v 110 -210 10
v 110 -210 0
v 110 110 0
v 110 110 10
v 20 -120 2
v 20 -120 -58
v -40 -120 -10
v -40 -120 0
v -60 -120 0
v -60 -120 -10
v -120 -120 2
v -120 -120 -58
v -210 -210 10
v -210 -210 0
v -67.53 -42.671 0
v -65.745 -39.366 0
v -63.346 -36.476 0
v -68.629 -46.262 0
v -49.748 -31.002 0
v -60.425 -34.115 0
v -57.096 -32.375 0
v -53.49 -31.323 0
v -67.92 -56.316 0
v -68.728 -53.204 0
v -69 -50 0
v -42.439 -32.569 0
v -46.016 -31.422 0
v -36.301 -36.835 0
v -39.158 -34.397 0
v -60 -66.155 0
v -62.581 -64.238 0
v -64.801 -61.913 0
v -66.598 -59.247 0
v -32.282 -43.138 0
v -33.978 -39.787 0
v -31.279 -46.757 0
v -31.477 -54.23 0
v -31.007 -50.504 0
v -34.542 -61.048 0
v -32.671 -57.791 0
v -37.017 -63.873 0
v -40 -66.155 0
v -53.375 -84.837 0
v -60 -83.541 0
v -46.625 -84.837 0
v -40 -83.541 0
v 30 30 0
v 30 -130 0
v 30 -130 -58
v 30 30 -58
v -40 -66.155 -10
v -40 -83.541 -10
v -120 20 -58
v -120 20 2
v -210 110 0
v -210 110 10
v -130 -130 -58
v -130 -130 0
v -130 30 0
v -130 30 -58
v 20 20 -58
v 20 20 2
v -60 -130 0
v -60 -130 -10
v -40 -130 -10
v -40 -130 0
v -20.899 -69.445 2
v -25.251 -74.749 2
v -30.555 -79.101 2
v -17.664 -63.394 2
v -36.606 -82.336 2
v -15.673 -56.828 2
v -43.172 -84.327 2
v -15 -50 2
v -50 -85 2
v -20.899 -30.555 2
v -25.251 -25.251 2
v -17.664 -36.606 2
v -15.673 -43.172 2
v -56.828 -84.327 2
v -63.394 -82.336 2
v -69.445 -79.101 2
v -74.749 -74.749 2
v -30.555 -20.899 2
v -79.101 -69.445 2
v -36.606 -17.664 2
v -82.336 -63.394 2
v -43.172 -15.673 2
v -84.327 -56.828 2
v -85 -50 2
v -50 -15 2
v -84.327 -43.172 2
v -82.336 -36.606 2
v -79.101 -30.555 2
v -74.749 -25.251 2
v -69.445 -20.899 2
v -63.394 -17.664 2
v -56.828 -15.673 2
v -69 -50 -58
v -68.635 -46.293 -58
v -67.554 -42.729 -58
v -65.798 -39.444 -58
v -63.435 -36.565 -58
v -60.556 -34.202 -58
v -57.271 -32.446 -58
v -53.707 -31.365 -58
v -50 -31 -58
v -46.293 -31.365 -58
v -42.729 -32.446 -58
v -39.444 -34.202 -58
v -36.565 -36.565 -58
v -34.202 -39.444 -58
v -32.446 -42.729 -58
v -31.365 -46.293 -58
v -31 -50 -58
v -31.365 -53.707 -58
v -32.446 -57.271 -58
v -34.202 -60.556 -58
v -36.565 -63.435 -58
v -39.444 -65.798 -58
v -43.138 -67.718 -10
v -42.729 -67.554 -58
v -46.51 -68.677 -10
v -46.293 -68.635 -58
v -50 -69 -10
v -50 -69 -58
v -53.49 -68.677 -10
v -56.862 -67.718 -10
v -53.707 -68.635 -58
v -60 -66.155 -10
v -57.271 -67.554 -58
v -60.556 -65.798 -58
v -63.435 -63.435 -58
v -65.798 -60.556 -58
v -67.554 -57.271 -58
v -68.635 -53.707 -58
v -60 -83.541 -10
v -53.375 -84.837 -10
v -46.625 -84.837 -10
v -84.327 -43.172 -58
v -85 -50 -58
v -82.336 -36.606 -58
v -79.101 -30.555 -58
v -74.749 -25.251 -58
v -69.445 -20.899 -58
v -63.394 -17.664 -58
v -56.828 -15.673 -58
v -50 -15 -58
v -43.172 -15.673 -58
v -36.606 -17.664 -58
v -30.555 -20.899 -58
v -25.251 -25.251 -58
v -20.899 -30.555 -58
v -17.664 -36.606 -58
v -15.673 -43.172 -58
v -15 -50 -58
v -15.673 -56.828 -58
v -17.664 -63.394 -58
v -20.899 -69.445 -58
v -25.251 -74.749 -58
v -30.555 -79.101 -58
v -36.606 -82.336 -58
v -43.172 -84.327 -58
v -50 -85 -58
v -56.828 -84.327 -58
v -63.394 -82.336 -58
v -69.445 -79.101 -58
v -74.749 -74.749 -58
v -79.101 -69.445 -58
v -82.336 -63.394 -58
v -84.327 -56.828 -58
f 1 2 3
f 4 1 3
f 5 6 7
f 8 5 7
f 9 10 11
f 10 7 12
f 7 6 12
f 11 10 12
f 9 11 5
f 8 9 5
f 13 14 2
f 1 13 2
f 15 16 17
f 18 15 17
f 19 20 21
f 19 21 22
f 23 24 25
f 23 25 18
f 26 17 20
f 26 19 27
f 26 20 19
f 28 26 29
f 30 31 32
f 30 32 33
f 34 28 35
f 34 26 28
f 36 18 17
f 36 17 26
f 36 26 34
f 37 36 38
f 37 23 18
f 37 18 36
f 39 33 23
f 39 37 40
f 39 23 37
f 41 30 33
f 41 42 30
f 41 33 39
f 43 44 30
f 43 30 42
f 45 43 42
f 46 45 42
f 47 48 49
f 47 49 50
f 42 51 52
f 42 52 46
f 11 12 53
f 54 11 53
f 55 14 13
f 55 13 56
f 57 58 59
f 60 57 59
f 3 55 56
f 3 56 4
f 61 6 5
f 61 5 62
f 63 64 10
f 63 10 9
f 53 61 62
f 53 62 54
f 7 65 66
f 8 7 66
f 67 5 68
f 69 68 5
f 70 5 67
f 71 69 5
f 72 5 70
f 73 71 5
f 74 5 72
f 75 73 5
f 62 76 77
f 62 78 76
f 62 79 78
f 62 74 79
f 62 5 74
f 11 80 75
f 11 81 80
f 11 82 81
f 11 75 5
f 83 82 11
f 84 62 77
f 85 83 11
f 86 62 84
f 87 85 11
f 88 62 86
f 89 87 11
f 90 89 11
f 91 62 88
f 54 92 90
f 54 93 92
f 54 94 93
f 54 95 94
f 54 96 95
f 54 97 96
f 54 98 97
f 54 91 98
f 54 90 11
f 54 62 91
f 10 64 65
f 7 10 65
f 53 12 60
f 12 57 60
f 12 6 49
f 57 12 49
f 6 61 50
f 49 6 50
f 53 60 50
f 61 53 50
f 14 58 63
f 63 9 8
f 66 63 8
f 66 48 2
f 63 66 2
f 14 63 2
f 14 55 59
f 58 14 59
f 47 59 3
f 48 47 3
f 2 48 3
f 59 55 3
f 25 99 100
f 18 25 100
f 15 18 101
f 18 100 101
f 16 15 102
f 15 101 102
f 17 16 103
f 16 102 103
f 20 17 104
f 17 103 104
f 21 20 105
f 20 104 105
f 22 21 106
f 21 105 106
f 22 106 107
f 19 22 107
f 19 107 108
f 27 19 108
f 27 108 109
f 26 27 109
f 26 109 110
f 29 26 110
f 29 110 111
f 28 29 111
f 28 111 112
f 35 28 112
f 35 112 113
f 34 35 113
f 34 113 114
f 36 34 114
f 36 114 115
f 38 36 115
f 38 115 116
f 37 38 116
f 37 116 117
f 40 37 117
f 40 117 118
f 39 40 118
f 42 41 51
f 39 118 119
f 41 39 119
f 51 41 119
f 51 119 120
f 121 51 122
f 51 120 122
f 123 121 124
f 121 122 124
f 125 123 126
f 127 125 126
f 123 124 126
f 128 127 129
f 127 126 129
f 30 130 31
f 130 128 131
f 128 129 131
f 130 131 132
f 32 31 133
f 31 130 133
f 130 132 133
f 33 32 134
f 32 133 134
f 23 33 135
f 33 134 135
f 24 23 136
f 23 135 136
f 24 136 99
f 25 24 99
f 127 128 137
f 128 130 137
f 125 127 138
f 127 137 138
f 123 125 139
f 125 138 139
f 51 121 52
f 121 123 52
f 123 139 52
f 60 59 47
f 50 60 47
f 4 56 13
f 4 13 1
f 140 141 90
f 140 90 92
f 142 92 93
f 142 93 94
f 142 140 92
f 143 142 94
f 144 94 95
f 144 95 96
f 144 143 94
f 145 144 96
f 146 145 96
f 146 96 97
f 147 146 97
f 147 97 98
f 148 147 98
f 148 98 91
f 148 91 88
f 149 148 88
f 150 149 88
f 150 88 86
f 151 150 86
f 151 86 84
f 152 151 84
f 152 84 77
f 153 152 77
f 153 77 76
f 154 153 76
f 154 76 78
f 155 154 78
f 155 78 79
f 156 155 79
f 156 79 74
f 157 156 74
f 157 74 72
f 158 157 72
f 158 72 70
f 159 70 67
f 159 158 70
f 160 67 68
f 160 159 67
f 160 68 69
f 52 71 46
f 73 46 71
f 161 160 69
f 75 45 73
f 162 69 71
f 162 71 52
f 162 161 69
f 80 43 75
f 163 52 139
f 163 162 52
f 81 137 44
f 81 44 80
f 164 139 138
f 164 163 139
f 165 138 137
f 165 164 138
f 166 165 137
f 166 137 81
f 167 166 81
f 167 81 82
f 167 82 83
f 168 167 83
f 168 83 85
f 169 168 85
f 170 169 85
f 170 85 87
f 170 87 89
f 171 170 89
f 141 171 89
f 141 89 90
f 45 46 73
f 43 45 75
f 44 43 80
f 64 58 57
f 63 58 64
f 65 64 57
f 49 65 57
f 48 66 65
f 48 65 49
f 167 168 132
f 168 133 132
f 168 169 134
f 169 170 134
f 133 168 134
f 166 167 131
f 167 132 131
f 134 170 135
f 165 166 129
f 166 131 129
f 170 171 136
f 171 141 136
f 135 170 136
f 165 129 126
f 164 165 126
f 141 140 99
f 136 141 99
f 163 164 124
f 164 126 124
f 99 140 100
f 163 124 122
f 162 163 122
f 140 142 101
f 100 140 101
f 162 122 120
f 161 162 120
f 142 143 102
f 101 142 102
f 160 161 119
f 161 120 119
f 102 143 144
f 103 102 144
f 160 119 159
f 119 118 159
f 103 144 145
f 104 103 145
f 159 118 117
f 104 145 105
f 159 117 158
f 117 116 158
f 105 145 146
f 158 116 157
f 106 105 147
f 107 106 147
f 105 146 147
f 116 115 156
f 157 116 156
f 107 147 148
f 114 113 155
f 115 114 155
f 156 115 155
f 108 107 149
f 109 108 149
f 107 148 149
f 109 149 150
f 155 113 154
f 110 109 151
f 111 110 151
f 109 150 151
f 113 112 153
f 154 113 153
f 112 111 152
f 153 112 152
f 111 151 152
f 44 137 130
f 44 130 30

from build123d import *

# Parameters (mm, degrees)
CROQUIS1_W              = 320
CROQUIS1_H              = 320
SALIENTE_EXTRUIR2_DEPTH = 10
CROQUIS2_W              = 160
CROQUIS2_H              = 160
SALIENTE_EXTRUIR3_DEPTH = 58
CROQUIS3_R              = 19
CORTAR_EXTRUIR1_DEPTH   = 58
CROQUIS6_W              = 140
CROQUIS6_H              = 140
CROQUIS6_R              = 35
CORTAR_EXTRUIR5_DEPTH   = 60
CROQUIS7_W              = 20
CROQUIS7_H              = 10
CORTAR_EXTRUIR6_DEPTH   = 69


with BuildPart() as part:
    # Croquis1 → Saliente-Extruir2 (new body)
    with BuildSketch(Plane.XY):
        with Locations((-50, -50)):
            Rectangle(CROQUIS1_W, CROQUIS1_H)
    extrude(amount=SALIENTE_EXTRUIR2_DEPTH)

    # Croquis2 → Saliente-Extruir3 (add)
    with BuildSketch(Plane.XY):
        with Locations((-50, -50)):
            Rectangle(CROQUIS2_W, CROQUIS2_H)
    extrude(amount=-SALIENTE_EXTRUIR3_DEPTH)

    # Croquis3 → Cortar-Extruir1 (cut)
    with BuildSketch(Plane(origin=(0, 0, -58), x_dir=(-1, 0, 0), z_dir=(0, 0, -1))):
        with Locations((50, -50)):
            Circle(CROQUIS3_R)
    extrude(amount=-CORTAR_EXTRUIR1_DEPTH, mode=Mode.SUBTRACT)

    # Croquis6 → Cortar-Extruir5 (cut)
    with BuildSketch(Plane(origin=(0, 0, -58), x_dir=(-1, 0, 0), z_dir=(0, 0, -1))):
        with Locations((50, -50)):
            Rectangle(CROQUIS6_W, CROQUIS6_H)
        with Locations((50, -50)):
            Circle(CROQUIS6_R, mode=Mode.SUBTRACT)
    extrude(amount=-CORTAR_EXTRUIR5_DEPTH, mode=Mode.SUBTRACT)

    # Croquis7 → Cortar-Extruir6 (cut)
    with BuildSketch(Plane.XZ.offset(130)):
        with Locations((-50, -5)):
            Rectangle(CROQUIS7_W, CROQUIS7_H)
    extrude(amount=-CORTAR_EXTRUIR6_DEPTH, mode=Mode.SUBTRACT)


solid = part.part
